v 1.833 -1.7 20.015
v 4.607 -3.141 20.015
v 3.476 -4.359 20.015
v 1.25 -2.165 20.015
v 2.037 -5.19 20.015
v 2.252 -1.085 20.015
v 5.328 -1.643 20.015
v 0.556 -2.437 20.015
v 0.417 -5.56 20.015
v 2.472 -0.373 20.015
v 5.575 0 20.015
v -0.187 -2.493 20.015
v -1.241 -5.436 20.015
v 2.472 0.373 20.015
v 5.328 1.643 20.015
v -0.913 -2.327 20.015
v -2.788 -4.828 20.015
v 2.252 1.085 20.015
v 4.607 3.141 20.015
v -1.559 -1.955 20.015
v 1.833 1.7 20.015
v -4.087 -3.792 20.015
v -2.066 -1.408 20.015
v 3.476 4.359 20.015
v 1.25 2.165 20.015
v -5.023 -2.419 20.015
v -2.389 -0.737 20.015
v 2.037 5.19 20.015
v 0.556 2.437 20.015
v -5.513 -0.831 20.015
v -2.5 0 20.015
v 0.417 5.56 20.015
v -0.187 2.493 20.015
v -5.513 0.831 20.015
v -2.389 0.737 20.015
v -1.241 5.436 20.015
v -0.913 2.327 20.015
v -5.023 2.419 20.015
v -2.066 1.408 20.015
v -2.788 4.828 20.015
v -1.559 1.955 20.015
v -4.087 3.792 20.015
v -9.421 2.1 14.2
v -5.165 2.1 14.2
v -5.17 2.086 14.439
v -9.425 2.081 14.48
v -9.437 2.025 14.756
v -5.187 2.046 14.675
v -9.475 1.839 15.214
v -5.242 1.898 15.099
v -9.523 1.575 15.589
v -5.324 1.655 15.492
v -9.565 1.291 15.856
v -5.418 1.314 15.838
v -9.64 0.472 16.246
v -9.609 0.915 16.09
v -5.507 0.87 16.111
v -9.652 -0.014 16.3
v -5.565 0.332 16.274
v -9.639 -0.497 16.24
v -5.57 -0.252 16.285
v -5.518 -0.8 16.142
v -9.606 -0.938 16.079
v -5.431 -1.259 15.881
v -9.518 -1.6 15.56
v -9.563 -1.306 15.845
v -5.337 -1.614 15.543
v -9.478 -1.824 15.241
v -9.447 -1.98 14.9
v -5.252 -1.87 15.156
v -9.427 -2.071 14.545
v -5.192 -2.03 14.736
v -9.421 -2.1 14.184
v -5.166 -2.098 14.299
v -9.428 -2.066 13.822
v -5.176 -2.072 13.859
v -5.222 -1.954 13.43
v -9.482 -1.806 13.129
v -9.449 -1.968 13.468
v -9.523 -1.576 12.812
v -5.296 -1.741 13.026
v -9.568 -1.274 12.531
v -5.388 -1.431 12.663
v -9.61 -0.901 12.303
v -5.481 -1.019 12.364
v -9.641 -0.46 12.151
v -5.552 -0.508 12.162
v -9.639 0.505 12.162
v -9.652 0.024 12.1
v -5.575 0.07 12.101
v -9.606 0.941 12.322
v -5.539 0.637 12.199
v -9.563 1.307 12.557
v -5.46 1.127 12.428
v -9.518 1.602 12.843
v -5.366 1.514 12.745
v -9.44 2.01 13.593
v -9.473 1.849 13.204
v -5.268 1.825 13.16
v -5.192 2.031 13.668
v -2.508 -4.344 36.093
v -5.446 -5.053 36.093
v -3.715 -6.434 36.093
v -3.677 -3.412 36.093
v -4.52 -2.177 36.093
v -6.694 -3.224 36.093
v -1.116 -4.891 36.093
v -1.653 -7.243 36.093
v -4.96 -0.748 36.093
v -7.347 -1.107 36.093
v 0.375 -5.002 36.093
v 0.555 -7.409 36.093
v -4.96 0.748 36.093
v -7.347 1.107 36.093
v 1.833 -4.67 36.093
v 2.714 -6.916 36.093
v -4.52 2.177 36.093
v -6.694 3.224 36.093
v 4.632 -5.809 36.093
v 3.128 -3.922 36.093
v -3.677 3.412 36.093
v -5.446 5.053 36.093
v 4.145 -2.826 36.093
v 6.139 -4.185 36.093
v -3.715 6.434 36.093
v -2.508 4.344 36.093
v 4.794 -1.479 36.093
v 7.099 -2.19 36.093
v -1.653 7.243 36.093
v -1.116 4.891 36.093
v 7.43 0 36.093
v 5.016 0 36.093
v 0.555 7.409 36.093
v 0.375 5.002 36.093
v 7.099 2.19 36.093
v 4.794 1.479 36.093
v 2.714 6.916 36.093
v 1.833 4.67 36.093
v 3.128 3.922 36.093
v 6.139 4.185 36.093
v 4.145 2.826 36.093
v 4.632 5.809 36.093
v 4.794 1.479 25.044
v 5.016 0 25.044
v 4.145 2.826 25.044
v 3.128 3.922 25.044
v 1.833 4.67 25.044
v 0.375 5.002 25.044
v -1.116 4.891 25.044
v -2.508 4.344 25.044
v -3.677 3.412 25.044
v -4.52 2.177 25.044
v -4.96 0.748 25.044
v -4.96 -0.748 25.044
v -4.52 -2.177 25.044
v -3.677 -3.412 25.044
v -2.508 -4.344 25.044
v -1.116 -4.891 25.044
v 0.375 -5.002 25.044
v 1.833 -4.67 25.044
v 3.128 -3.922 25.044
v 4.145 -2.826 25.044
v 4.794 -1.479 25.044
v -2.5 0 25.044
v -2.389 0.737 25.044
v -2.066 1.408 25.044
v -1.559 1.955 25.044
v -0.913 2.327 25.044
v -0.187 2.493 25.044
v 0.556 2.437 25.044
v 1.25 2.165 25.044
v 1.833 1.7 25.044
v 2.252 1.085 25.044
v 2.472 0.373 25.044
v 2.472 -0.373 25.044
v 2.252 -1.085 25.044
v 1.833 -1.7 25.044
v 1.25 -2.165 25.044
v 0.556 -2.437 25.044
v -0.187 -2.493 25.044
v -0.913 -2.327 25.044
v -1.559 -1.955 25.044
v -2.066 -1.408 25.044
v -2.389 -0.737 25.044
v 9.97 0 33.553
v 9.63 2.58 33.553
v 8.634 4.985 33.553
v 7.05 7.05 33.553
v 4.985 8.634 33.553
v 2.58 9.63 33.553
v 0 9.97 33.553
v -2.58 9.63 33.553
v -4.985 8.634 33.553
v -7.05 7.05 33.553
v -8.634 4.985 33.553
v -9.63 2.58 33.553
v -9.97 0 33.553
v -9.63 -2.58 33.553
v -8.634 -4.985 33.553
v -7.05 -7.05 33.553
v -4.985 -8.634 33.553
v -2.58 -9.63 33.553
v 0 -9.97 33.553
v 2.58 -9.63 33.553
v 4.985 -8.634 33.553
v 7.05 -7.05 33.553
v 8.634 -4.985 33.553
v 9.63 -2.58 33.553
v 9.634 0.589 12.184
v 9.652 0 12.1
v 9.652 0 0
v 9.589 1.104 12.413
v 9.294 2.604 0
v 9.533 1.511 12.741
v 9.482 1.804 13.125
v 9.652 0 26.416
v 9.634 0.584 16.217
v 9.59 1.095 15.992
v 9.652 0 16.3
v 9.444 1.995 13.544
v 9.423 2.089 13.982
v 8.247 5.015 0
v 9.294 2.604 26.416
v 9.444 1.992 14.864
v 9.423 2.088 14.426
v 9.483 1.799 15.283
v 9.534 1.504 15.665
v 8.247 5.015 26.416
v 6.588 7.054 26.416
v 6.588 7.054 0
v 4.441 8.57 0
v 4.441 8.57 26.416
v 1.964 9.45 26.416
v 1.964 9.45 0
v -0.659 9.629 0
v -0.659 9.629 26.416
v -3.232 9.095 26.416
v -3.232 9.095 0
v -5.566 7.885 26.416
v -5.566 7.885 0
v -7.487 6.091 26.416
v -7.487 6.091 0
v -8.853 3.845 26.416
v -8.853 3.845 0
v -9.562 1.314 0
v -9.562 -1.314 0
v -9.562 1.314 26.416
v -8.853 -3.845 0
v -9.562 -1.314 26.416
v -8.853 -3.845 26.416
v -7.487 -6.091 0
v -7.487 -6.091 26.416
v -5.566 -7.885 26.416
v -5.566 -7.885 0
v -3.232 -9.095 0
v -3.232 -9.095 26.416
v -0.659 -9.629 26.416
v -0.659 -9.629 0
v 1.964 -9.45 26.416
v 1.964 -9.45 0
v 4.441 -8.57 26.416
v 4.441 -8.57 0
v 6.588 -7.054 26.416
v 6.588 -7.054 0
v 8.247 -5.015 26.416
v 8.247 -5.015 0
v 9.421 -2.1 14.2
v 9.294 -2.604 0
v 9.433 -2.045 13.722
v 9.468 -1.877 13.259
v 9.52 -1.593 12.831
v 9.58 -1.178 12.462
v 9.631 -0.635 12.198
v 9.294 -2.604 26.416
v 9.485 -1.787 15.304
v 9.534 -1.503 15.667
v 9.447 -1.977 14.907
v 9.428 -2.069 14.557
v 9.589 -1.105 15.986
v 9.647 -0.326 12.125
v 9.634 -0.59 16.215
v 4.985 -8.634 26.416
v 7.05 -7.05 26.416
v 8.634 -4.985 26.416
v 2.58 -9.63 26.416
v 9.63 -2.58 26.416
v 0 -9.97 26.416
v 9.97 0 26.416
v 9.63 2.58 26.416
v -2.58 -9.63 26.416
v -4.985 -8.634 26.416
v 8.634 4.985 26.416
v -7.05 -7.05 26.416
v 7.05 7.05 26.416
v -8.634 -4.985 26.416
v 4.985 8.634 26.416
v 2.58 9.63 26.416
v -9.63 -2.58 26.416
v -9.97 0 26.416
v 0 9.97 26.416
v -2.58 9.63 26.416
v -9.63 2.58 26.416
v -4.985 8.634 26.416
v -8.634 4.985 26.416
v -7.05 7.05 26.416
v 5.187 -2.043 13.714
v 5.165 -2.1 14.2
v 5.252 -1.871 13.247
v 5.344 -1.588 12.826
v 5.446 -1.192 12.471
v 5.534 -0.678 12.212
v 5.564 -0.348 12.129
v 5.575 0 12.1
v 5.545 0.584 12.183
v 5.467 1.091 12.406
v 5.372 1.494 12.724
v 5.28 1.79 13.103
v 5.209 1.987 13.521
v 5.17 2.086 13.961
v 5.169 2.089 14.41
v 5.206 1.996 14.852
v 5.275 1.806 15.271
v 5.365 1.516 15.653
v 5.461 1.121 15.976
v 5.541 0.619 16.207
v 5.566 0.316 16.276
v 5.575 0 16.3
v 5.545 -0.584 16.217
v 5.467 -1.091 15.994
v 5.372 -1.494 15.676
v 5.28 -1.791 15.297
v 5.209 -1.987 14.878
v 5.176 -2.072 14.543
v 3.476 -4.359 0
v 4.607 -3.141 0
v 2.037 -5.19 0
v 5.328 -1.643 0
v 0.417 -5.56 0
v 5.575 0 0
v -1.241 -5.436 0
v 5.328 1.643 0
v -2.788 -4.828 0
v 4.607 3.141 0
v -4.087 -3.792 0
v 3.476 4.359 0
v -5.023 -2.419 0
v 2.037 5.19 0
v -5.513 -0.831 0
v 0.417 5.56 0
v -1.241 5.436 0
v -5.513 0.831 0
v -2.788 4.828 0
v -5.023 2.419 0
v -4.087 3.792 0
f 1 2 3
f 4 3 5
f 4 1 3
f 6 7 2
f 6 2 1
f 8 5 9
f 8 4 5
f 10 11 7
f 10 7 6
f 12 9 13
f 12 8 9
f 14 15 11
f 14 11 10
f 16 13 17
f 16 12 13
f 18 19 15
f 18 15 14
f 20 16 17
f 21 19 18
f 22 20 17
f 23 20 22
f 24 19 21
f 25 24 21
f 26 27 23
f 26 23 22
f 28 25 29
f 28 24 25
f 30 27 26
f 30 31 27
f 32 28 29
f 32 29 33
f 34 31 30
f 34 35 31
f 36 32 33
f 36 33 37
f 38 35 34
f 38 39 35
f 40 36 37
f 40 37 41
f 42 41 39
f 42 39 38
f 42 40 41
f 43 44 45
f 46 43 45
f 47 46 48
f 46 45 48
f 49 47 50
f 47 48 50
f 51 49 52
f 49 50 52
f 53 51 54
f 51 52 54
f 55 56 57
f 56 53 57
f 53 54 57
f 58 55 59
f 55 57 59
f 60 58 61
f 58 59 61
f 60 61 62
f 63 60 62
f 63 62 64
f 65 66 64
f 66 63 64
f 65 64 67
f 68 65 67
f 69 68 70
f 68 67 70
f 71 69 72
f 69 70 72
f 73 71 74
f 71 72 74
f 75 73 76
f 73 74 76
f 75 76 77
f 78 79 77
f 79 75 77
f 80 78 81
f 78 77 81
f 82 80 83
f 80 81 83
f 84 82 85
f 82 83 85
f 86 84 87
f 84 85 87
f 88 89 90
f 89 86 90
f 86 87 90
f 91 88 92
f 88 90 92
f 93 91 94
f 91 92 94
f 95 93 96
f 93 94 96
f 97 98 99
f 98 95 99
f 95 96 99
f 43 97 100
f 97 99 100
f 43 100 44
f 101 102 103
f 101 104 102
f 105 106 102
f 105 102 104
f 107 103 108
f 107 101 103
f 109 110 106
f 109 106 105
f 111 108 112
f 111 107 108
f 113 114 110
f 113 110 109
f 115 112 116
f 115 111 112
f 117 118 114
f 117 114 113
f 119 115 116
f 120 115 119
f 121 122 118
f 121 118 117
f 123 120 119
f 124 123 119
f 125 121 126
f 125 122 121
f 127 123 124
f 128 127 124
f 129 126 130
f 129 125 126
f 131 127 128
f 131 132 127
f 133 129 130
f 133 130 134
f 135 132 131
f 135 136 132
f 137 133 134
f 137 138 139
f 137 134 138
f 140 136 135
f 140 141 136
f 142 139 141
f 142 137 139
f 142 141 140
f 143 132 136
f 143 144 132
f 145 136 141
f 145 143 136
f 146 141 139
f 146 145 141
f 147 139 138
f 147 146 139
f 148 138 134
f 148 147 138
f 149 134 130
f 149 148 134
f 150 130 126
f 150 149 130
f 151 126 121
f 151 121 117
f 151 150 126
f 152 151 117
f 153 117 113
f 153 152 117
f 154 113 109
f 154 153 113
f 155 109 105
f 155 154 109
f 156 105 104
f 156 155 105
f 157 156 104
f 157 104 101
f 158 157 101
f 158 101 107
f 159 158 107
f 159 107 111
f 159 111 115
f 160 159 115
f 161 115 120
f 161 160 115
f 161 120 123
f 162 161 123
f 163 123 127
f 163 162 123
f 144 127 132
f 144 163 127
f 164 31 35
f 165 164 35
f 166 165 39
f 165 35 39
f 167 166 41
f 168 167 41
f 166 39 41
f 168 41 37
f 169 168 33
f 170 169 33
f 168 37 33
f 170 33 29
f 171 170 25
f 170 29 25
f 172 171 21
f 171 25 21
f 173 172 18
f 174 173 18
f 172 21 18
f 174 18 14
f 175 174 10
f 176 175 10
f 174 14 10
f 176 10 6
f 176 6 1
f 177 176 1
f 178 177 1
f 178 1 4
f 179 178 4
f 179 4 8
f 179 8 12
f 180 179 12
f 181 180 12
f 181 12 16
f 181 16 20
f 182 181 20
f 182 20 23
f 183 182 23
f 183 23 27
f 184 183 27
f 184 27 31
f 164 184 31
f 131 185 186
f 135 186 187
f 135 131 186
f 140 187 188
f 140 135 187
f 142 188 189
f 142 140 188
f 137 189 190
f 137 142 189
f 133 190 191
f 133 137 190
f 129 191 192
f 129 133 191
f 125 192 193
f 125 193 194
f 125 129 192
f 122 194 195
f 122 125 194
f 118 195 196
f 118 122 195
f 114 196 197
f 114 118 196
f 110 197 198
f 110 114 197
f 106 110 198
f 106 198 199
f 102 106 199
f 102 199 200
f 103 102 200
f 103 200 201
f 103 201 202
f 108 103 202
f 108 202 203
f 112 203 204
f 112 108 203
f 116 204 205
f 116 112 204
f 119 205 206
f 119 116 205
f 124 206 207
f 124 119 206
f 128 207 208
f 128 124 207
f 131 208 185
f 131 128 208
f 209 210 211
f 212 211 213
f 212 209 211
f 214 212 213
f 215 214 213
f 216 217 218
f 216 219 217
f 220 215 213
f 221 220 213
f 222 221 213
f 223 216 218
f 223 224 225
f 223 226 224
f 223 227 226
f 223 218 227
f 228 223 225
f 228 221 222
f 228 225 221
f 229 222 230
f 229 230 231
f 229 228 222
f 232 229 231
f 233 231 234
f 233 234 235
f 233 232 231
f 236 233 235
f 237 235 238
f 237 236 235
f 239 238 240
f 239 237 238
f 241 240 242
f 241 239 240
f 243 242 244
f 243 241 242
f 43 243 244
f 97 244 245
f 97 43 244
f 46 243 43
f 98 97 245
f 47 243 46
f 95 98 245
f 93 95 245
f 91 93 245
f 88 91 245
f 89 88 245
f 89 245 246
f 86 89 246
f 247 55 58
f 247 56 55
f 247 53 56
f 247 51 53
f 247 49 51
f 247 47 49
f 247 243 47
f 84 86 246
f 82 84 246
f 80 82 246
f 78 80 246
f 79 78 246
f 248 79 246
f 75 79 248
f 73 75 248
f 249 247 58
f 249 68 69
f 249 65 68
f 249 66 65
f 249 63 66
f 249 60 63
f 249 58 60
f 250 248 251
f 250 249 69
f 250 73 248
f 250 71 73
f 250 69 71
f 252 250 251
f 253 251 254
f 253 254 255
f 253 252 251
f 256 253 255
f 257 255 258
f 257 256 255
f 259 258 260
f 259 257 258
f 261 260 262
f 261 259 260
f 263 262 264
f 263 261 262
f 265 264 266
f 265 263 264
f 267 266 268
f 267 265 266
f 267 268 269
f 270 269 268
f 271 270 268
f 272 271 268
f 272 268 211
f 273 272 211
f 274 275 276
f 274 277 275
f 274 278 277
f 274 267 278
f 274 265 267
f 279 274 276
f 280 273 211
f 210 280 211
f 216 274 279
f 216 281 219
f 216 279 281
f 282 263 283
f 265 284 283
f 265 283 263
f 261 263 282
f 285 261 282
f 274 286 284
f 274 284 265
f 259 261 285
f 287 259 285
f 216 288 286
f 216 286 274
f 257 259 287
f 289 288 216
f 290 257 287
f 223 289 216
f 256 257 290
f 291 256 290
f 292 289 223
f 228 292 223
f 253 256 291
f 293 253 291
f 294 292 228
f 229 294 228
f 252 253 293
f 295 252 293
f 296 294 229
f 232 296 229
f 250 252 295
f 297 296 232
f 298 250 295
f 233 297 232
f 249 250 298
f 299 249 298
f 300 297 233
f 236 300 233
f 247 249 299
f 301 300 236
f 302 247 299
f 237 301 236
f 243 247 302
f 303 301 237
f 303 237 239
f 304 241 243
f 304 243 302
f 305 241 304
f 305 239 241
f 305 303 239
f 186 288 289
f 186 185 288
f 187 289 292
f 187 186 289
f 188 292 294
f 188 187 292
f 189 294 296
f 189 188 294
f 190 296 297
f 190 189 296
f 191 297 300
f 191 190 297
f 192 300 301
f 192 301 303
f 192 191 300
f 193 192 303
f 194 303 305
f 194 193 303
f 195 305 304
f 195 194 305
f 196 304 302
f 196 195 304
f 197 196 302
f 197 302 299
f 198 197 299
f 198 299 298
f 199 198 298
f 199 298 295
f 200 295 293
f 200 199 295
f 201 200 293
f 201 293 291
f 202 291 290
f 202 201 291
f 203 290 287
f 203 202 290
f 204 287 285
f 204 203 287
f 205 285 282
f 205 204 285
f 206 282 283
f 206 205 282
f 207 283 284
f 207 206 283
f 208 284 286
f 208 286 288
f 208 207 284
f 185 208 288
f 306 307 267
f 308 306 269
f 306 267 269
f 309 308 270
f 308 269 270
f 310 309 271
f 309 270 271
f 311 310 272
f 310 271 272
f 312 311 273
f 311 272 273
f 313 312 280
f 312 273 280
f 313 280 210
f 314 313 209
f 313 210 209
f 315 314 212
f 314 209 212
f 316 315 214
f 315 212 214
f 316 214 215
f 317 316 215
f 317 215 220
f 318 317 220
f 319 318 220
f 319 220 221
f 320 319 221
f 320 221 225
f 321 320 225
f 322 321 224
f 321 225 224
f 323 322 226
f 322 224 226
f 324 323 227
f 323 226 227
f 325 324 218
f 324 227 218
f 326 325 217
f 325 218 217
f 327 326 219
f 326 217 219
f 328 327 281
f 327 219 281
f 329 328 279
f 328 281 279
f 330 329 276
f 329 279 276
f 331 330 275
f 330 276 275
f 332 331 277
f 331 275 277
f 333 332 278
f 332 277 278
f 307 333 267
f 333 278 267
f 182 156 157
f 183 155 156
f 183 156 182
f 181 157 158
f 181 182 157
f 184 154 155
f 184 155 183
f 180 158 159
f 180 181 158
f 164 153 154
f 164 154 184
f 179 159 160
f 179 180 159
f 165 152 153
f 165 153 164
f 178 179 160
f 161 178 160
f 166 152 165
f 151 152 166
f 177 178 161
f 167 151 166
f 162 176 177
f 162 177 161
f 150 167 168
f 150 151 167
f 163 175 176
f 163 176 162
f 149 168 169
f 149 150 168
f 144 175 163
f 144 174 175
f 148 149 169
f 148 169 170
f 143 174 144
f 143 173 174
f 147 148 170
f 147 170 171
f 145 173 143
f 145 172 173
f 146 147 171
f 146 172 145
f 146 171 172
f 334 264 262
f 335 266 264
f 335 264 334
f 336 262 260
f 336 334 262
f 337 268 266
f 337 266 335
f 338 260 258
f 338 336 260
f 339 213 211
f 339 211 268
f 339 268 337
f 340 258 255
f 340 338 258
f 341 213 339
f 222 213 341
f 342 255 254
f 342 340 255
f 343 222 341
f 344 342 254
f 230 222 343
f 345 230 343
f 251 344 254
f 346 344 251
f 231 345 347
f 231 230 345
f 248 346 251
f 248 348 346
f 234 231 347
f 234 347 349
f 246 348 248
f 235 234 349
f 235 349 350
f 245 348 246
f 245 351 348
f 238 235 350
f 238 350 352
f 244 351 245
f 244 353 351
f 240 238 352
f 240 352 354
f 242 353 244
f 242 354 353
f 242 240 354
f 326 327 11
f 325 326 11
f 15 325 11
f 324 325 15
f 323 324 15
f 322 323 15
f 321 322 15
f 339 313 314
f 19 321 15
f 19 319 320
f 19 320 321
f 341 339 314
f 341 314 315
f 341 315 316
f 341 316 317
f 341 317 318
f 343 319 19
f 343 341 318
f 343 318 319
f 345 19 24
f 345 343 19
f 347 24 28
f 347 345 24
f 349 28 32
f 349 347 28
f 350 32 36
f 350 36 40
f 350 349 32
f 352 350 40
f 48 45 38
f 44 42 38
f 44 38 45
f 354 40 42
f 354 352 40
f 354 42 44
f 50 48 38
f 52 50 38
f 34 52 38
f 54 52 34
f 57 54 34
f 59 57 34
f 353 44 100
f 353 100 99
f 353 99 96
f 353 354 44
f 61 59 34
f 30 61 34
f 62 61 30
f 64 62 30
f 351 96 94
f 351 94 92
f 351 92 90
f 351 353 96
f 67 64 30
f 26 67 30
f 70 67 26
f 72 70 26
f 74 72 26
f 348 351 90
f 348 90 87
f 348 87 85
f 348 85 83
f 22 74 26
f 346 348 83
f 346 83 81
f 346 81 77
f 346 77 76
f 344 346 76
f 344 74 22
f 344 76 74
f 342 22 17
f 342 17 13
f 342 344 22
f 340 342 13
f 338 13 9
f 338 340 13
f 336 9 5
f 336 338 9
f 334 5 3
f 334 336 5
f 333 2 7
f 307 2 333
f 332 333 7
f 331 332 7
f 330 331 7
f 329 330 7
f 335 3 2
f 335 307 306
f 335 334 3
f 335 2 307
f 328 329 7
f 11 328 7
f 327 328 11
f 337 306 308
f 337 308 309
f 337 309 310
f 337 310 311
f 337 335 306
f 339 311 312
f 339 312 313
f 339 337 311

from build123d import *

# Parameters (mm, degrees)
F4_D     = 5
F5_D     = 4.2
F5_DEPTH = 9.9705
F6_D     = 4.2


with BuildPart() as f1:
    # F0 (on Front) → F1 (revolve)
    with BuildSketch(Plane.XZ):
        Polygon((5.5753, 20.0152), (5.5753, 0), (9.652, 0), (9.652, 26.416), (9.9695, 26.416), (9.9695, 33.5534), (7.4295, 36.0934), (5.0165, 36.0934), (5.0165, 25.0444), (0, 25.0444), (0, 20.0152), align=None)
    revolve(axis=Axis((0, 0, 18.0467), (0, 0, 1)))

    # F4 (through all)
    with Locations(Plane.XY.offset(25.0444)):
        with Locations((0, 0)):
            Hole(F4_D / 2)

    # F5 (through all, one way)
    with BuildSketch(Plane.YZ):
        with Locations((0, 14.2)):
            Circle(F5_D / 2)
    extrude(amount=-F5_DEPTH, mode=Mode.SUBTRACT)

    # F6 (through all)
    with Locations(Plane(origin=(0, 0, 0), x_dir=(0, 1, 0), z_dir=(-1, 0, 0))):
        with Locations((0, -14.2)):
            Hole(F6_D / 2)


solid = f1.part
